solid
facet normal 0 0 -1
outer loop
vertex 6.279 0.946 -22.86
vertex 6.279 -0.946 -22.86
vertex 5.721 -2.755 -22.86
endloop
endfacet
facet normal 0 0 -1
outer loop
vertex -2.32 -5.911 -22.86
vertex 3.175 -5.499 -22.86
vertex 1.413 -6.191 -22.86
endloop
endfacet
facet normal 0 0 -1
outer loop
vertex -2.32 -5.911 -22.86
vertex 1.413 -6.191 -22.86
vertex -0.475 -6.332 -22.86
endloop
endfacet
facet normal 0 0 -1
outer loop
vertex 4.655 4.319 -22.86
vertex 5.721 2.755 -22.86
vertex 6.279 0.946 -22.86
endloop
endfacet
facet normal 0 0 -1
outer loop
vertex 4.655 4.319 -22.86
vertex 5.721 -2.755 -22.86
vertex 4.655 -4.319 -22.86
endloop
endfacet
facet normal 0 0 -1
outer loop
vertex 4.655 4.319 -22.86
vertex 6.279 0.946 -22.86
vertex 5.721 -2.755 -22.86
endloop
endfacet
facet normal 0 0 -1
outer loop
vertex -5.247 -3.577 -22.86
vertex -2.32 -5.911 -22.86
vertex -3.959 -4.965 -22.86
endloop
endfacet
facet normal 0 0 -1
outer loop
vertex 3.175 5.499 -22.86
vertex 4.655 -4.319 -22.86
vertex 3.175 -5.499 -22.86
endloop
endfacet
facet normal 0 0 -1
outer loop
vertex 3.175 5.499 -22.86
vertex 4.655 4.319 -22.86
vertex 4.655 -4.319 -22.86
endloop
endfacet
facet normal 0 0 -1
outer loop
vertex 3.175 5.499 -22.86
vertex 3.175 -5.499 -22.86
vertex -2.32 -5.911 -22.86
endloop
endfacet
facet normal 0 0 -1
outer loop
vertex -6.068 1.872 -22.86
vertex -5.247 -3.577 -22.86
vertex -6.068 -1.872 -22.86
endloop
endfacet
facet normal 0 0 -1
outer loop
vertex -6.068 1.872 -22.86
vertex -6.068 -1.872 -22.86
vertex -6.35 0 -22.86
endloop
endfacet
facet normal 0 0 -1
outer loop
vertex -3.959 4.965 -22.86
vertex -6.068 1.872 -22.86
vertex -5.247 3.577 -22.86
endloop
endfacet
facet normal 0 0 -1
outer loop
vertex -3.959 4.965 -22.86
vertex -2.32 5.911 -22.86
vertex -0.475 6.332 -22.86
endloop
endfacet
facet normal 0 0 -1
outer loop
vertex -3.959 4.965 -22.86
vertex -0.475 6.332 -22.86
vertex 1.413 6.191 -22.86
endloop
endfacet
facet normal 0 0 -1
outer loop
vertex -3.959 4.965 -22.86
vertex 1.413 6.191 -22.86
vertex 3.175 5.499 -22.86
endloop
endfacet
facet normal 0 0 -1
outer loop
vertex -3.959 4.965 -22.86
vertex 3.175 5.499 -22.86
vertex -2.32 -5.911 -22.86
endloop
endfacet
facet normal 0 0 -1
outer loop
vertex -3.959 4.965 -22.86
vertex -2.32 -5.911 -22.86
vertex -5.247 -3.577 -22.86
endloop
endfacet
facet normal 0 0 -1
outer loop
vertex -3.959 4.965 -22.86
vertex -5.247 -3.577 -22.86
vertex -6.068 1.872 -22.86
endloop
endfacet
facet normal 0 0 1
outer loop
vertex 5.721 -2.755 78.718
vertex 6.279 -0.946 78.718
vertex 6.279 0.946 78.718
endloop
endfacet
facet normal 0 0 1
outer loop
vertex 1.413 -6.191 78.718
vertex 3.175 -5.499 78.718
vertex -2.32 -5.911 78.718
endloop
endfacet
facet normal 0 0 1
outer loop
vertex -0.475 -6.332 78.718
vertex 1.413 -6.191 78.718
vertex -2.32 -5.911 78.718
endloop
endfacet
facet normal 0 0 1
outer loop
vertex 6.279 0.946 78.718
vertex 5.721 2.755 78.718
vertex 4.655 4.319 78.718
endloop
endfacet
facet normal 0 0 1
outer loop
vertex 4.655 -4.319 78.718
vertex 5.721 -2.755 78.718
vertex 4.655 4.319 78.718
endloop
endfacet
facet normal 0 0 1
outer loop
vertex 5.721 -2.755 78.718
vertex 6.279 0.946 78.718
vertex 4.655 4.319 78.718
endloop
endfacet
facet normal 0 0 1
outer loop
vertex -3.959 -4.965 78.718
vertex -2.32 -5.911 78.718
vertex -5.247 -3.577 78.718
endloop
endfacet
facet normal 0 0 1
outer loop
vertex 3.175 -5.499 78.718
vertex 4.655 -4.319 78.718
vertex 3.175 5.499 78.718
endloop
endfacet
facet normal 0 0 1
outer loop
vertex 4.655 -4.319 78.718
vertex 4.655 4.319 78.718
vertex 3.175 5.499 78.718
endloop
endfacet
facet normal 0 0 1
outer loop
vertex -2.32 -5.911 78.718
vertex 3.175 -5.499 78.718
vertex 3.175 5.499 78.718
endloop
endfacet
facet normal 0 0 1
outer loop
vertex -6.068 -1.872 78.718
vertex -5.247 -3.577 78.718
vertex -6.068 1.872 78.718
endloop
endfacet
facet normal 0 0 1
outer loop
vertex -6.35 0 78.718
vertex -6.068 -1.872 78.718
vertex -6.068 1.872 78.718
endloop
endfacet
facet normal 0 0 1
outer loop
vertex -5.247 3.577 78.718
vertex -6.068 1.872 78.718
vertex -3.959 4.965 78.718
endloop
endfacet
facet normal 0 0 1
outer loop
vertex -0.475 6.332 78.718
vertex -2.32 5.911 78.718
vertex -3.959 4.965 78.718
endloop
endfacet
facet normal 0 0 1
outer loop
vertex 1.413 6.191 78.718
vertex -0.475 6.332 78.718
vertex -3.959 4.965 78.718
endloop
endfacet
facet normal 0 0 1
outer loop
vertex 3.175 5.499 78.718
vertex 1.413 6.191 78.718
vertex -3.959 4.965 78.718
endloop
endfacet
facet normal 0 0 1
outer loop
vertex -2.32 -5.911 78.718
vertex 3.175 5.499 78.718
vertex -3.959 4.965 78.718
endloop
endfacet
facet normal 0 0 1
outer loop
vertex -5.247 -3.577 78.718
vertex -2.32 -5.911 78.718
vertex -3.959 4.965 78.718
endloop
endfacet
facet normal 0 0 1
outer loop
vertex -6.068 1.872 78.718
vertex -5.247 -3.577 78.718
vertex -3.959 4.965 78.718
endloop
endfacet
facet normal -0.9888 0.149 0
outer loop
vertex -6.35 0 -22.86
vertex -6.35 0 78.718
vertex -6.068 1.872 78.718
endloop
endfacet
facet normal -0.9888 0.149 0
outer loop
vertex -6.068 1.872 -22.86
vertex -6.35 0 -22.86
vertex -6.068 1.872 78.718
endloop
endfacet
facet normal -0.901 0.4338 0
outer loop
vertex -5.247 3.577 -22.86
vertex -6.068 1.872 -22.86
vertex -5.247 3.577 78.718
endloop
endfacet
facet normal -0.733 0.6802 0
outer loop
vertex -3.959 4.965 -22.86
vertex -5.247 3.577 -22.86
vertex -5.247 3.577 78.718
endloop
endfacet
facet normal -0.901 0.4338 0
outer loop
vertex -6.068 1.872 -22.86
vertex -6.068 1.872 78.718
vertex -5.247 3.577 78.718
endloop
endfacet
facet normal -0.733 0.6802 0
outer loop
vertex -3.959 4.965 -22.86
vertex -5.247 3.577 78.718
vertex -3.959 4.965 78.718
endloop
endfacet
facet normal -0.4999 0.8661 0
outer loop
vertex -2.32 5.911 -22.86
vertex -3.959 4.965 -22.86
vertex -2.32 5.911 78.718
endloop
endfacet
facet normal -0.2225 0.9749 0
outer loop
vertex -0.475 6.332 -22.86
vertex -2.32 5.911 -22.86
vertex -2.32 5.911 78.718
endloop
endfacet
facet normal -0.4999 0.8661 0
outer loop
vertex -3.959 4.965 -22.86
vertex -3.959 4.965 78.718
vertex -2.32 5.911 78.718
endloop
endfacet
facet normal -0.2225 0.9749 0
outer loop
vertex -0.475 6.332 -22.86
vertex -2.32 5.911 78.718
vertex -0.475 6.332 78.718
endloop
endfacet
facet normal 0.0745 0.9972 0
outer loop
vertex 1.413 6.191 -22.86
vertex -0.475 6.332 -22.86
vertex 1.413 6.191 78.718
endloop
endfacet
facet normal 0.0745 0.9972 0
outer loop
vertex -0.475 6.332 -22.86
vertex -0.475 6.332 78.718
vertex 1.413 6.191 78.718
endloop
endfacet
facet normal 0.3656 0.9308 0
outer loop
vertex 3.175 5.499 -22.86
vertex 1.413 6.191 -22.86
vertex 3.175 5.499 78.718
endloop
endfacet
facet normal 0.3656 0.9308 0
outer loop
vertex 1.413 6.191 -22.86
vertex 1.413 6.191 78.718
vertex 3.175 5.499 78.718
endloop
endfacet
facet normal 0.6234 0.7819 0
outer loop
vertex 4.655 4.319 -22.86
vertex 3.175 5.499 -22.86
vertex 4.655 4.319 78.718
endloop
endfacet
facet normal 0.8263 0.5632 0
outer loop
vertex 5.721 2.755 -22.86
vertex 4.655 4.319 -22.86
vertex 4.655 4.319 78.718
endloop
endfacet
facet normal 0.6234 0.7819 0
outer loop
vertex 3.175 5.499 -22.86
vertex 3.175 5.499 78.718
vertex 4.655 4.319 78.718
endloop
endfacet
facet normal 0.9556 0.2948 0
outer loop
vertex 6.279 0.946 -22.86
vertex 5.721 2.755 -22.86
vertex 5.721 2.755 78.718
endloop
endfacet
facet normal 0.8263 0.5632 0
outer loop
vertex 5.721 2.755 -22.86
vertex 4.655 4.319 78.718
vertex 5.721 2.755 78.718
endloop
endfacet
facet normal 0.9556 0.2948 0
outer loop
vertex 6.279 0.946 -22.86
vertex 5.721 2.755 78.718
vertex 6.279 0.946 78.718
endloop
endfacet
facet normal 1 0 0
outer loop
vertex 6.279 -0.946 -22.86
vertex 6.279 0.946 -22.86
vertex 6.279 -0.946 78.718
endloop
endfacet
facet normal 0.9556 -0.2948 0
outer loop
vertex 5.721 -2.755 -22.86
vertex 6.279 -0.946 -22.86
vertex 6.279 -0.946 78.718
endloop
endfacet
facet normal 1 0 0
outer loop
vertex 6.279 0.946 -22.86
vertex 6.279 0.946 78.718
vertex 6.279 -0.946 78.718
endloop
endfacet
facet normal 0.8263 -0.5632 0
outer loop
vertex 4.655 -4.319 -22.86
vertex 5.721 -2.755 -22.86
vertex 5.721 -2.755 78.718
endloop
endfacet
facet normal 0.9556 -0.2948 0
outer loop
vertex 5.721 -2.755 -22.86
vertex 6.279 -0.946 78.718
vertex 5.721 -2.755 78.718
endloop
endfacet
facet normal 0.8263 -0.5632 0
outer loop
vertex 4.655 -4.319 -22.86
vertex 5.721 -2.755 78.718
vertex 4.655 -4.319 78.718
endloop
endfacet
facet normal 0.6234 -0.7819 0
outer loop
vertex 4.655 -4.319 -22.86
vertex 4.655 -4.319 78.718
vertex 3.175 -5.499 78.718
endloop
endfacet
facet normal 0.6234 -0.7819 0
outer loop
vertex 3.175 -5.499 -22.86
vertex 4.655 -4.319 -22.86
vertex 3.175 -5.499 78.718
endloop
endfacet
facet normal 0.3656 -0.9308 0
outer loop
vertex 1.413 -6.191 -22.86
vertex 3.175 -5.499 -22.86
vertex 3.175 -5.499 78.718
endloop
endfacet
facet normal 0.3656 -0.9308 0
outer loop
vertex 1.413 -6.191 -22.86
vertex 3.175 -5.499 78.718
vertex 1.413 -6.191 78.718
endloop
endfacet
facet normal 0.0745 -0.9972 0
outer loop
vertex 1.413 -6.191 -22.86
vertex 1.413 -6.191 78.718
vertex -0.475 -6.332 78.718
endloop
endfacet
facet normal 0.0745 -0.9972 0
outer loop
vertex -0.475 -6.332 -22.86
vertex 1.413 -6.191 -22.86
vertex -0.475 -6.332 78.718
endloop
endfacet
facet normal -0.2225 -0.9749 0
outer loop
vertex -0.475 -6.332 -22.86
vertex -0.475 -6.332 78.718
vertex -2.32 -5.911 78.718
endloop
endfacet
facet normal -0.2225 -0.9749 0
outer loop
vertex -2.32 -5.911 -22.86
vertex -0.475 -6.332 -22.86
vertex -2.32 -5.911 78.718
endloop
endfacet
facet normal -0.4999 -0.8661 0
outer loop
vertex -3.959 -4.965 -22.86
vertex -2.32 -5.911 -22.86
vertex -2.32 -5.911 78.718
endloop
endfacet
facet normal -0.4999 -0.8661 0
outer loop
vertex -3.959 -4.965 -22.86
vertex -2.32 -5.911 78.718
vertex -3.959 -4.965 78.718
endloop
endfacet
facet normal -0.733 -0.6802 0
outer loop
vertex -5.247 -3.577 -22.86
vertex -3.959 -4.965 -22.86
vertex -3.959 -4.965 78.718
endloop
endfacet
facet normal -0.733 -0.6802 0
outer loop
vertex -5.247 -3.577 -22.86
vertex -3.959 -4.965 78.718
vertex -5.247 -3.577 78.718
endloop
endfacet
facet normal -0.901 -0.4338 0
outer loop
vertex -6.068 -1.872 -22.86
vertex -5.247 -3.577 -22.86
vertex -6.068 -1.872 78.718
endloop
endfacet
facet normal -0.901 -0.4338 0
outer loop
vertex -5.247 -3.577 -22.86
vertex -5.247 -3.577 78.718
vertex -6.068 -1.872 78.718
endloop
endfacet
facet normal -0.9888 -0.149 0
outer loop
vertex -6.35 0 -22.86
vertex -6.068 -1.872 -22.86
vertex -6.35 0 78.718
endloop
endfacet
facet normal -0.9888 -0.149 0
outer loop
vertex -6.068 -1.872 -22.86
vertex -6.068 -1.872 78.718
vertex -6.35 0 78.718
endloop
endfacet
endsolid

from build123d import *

# Parameters (mm, degrees)
BOSS_EXTRUDE1_START     = -101.577628265
BOSS_EXTRUDE1_OUTLINE_R = 6.35
BOSS_EXTRUDE1_DEPTH     = 101.577628265


# Read off the part's stored shape, not the designer's step: Boss-Extrude1
with BuildPart() as part:
    # Boss-Extrude1 outline → Boss-Extrude1 (new body)
    with BuildSketch(Plane(origin=(0, 0, -22.86), x_dir=(-1, 0, 0), z_dir=(0, 0, -1)).offset(BOSS_EXTRUDE1_START)):
        Circle(BOSS_EXTRUDE1_OUTLINE_R)
    extrude(amount=BOSS_EXTRUDE1_DEPTH)


solid = part.part
